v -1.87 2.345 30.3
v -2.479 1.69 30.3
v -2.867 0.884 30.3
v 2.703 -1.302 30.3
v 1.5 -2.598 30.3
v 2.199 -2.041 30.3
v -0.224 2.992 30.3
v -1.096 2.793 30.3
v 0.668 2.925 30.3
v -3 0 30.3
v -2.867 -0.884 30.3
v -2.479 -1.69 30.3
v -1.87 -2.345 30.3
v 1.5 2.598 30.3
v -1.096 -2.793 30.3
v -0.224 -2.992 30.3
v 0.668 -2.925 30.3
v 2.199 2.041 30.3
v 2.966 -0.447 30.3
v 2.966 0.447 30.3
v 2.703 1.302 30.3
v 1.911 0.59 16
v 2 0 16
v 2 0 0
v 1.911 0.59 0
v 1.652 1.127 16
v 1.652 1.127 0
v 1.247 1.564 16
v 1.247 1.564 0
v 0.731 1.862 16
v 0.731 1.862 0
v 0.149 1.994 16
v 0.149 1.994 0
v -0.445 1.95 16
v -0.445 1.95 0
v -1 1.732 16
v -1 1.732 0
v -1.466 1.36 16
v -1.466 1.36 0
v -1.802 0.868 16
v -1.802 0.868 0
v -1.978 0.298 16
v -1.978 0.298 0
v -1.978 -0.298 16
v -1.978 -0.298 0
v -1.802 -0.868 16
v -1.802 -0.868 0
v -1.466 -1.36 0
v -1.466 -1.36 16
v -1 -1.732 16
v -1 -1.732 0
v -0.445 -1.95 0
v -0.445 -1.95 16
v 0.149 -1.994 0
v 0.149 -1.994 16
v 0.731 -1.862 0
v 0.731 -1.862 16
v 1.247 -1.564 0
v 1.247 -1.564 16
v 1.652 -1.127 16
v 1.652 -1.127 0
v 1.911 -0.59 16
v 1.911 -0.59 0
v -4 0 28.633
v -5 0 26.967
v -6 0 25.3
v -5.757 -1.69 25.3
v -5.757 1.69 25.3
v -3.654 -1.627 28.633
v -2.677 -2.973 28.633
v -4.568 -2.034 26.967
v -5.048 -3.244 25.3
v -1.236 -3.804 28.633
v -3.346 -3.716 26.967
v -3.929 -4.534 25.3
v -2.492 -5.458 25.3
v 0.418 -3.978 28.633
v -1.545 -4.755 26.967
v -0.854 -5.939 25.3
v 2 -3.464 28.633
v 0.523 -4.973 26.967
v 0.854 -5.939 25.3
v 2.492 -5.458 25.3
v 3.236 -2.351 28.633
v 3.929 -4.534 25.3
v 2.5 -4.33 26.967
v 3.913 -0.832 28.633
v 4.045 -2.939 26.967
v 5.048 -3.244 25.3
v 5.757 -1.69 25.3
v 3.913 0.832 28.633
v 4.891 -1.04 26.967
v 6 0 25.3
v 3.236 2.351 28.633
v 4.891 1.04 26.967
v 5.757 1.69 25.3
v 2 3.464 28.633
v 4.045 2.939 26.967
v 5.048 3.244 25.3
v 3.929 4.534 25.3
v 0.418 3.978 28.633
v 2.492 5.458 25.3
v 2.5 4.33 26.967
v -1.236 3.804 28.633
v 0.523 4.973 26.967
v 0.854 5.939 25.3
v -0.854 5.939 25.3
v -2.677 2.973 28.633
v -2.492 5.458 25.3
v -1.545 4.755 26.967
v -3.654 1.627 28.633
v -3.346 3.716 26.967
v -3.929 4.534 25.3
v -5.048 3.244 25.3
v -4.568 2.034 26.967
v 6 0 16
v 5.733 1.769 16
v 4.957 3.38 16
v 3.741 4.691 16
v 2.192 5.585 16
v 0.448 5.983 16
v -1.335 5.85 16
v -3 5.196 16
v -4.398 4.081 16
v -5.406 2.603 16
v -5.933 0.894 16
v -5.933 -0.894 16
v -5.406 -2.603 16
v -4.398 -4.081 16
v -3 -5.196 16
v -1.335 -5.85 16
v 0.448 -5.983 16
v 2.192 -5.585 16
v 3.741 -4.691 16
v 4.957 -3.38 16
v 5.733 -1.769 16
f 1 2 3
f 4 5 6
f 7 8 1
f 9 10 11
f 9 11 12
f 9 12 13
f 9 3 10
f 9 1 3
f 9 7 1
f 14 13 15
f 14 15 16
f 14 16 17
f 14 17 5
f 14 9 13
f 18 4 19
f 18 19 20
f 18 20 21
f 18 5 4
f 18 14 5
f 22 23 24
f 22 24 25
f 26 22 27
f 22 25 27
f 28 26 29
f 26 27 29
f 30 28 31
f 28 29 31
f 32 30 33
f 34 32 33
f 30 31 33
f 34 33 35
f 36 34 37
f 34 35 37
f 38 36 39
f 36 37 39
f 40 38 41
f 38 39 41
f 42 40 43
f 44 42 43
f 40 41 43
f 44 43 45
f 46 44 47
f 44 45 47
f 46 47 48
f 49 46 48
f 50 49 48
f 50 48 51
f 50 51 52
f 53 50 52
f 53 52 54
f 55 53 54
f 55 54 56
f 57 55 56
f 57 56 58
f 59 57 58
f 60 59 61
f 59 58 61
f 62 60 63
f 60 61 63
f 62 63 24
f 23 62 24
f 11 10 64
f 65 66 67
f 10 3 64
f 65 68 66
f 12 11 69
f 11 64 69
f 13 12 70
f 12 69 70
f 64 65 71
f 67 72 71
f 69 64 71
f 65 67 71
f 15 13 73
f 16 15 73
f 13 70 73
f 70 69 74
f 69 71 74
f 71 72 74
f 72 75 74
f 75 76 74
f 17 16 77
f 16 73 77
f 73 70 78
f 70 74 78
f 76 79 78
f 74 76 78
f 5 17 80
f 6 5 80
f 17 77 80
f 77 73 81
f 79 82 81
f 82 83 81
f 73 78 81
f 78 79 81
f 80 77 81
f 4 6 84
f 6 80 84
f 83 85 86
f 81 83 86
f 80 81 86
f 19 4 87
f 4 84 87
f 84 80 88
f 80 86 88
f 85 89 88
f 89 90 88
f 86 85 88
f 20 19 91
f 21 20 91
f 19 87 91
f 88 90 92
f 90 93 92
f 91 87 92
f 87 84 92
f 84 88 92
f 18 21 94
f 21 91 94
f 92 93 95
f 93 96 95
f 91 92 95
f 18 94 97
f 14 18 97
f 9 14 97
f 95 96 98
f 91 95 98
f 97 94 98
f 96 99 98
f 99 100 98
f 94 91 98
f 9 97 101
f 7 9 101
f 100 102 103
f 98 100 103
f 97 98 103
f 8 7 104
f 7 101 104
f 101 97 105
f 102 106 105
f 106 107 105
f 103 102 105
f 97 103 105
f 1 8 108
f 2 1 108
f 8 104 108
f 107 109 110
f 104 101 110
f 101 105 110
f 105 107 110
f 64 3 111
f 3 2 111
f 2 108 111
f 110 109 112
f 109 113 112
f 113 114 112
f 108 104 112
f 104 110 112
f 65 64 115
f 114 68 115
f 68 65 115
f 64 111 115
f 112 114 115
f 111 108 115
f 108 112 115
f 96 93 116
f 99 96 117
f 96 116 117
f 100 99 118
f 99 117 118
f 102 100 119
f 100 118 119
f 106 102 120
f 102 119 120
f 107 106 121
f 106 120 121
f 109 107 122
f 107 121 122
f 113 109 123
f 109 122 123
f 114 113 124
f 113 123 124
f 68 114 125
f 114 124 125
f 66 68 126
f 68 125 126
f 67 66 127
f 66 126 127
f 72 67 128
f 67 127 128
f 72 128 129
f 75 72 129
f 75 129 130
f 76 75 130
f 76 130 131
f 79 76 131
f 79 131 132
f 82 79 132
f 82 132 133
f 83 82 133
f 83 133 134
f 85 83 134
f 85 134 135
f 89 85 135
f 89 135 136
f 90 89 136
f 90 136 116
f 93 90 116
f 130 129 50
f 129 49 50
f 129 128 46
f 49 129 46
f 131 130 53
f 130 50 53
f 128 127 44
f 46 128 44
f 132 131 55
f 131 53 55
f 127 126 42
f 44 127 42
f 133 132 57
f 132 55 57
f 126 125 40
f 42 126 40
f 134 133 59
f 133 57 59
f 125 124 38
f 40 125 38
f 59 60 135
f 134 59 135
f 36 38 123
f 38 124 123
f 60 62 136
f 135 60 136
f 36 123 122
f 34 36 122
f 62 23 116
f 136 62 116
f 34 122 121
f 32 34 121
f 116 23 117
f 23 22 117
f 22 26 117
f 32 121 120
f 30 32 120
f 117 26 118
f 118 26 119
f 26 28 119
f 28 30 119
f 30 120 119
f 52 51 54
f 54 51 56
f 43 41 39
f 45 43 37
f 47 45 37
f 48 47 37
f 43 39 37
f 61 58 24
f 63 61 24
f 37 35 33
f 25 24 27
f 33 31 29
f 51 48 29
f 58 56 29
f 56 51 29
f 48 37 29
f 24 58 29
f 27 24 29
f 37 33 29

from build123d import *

# Parameters (mm, degrees)
SKETCH_1_R      = 2
EXTRUDE_1_DEPTH = 16
SKETCH_2_R      = 6
EXTRUDE_2_DEPTH = 14.3


with BuildPart() as part:
    # 草图1 → 凸台-拉伸1 (new body)
    with BuildSketch(Plane.XY):
        Circle(SKETCH_1_R)
    extrude(amount=EXTRUDE_1_DEPTH)

    # 草图2 → 凸台-拉伸2 (add)
    with BuildSketch(Plane.XY.offset(16)):
        Circle(SKETCH_2_R)
    extrude(amount=EXTRUDE_2_DEPTH)

    # 草图3 → 切除-旋转2 (revolve, cut)
    with BuildSketch(Plane(origin=(0, 0, 0), x_dir=(1, 0, 0), z_dir=(0, 1, 0))):
        Polygon((-3, -30.3), (-6, -25.3), (-6, -30.3), align=None)
    revolve(axis=Axis((0, 0, 0), (0, 0, 1)), mode=Mode.SUBTRACT)


solid = part.part
